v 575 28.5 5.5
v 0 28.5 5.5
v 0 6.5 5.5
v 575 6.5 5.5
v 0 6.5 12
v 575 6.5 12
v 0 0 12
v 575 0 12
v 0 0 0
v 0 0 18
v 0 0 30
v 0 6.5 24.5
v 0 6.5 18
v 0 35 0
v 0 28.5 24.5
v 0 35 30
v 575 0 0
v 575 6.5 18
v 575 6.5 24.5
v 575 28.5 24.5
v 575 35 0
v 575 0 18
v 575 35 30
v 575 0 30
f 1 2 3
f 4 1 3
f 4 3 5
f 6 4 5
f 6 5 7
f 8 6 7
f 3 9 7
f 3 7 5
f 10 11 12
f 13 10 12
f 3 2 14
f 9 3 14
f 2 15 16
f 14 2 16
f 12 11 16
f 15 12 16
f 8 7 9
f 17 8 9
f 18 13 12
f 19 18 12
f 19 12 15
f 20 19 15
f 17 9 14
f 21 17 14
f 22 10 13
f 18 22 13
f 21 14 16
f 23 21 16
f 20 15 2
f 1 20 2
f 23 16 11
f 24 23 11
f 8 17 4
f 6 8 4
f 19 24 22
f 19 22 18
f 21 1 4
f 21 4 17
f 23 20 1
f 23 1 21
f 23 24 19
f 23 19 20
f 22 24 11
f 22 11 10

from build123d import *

# Parameters (mm, degrees)
PAD_DEPTH = 575


with BuildPart() as part:
    # Sketch → Pad (new body)
    with BuildSketch(Plane.YZ):
        Polygon((0, 0), (35, 0), (35, 30), (0, 30), (0, 18), (6.5, 18), (6.5, 24.5), (28.5, 24.5), (28.5, 5.5), (6.5, 5.5), (6.5, 12), (0, 12), align=None)
    extrude(amount=PAD_DEPTH)


solid = part.part
